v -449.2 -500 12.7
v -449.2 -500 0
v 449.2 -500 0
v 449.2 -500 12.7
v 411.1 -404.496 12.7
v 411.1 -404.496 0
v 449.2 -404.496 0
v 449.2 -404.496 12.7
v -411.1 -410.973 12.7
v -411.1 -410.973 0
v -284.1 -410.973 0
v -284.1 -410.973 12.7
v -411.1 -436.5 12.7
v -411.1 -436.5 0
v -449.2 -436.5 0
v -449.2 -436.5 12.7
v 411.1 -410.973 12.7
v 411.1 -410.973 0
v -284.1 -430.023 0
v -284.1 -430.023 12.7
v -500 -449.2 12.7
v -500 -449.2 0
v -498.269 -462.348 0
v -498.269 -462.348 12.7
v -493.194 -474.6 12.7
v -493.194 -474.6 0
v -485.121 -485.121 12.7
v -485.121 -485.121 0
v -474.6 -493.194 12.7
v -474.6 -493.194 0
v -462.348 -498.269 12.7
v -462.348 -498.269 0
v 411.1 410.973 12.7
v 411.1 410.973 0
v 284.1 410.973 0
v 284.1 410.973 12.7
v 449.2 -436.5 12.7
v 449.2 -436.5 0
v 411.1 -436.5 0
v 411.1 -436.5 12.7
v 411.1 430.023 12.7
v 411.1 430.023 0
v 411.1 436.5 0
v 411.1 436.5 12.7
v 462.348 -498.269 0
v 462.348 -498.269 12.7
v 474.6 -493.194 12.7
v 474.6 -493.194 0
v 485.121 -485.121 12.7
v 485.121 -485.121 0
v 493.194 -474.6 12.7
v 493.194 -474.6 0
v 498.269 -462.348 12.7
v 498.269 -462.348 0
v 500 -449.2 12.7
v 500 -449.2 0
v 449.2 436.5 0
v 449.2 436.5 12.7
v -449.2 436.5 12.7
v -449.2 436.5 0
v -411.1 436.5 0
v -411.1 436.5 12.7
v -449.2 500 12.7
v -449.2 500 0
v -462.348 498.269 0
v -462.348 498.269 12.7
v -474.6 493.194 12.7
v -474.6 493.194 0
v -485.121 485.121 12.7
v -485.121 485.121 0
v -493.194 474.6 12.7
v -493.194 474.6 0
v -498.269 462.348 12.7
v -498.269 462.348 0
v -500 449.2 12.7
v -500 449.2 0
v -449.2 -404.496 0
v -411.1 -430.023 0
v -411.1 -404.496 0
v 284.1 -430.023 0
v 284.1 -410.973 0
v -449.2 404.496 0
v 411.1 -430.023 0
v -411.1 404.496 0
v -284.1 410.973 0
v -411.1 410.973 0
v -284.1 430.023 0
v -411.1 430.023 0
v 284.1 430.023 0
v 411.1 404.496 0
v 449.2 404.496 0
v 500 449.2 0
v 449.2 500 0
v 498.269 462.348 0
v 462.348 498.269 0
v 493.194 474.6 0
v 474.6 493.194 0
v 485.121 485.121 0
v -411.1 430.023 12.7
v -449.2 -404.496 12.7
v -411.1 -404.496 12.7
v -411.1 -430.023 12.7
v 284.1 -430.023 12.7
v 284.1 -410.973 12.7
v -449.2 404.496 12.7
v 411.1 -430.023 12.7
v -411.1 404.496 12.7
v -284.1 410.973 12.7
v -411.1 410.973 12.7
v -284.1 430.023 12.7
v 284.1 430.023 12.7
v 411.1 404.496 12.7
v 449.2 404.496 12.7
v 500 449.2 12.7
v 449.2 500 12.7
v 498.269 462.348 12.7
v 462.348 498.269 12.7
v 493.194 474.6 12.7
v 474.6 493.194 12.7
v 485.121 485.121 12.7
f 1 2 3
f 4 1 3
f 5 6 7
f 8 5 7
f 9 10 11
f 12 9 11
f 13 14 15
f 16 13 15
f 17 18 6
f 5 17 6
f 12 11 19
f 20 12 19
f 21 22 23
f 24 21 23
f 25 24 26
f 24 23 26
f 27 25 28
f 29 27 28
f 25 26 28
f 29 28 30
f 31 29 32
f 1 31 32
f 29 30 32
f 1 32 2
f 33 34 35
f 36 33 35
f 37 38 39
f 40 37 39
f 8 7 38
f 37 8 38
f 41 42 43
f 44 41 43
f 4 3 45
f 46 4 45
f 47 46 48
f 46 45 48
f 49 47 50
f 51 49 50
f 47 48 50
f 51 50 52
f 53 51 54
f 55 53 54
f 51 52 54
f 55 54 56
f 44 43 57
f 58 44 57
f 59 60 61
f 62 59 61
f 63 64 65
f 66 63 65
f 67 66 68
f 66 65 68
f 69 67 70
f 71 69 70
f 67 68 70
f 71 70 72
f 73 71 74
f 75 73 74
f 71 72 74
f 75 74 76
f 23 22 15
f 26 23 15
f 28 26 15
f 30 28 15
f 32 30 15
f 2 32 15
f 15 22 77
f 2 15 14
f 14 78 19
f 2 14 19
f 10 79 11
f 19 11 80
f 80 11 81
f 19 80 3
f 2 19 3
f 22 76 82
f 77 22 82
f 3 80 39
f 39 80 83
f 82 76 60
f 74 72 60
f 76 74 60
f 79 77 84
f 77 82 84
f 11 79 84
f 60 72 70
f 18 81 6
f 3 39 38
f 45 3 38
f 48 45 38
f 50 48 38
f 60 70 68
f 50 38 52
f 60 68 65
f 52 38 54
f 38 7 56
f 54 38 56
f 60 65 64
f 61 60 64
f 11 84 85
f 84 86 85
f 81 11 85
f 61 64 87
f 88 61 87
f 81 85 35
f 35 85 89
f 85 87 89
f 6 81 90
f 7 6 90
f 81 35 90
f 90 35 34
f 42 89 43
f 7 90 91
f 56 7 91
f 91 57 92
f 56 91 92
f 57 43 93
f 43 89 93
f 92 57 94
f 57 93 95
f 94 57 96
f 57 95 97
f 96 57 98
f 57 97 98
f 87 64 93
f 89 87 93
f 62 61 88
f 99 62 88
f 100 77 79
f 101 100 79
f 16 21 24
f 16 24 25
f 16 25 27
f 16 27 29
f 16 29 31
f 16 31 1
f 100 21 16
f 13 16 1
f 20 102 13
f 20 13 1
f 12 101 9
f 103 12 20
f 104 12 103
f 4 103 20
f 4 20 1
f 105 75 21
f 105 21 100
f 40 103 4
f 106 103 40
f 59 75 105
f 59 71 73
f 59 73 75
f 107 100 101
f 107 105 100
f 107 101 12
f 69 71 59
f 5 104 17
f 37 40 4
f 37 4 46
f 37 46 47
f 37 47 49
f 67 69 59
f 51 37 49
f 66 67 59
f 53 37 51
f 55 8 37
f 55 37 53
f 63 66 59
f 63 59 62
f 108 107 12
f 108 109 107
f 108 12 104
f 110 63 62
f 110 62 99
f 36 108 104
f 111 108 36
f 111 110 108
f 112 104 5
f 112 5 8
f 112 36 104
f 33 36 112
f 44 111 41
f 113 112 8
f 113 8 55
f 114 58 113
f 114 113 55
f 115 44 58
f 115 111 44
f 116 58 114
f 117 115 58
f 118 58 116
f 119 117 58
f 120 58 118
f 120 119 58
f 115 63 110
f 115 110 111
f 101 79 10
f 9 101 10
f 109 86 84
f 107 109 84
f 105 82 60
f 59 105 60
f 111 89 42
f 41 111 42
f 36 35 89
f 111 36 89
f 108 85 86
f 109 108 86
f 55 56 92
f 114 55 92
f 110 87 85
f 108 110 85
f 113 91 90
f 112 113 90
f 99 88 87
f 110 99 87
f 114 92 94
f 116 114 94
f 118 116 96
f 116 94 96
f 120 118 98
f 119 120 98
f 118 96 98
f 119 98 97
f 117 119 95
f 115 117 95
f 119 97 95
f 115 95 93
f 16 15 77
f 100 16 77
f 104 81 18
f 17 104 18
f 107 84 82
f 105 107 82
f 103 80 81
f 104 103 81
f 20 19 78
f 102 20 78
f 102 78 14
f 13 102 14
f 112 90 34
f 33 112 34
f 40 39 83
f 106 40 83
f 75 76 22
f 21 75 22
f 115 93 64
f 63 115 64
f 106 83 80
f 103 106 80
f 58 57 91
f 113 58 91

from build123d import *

# Parameters (mm, degrees)
F1_DEPTH = 12.7


with BuildPart() as f1:
    # F0 (on Top) → F1 (new body)
    with BuildSketch(Plane.XY):
        with BuildLine():
            Line((0, 500), (-449.2, 500))
            ThreePointArc((-449.2, 500), (-485.121024, 485.121024), (-500, 449.2))
            Line((-500, 449.2), (-500, 0))
            Line((-500, 0), (0, 0))
            Line((0, 0), (0, 500))
        make_face()
        Polygon((-411.1, 410.973), (-411.1, 404.496), (-449.2, 404.496), (-449.2, 436.5), (-411.1, 436.5), (-411.1, 430.023), (-284.1, 430.023), (-284.1, 410.973), align=None, mode=Mode.SUBTRACT)
        with BuildLine():
            Line((449.2, 500), (0, 500))
            Line((0, 500), (0, 0))
            Line((0, 0), (500, 0))
            Line((500, 0), (500, 449.2))
            ThreePointArc((500, 449.2), (485.121024, 485.121024), (449.2, 500))
        make_face()
        Polygon((411.1, 430.023), (411.1, 436.5), (449.2, 436.5), (449.2, 404.496), (411.1, 404.496), (411.1, 410.973), (284.1, 410.973), (284.1, 430.023), align=None, mode=Mode.SUBTRACT)
        with BuildLine():
            Line((500, 0), (0, 0))
            Line((0, 0), (0, -500))
            Line((0, -500), (449.2, -500))
            ThreePointArc((449.2, -500), (485.121024, -485.121024), (500, -449.2))
            Line((500, -449.2), (500, 0))
        make_face()
        Polygon((284.1, -430.023), (284.1, -410.973), (411.1, -410.973), (411.1, -404.496), (449.2, -404.496), (449.2, -436.5), (411.1, -436.5), (411.1, -430.023), align=None, mode=Mode.SUBTRACT)
        with BuildLine():
            Line((0, -500), (0, 0))
            Line((0, 0), (-500, 0))
            Line((-500, 0), (-500, -449.2))
            ThreePointArc((-500, -449.2), (-485.121024, -485.121024), (-449.2, -500))
            Line((-449.2, -500), (0, -500))
        make_face()
        Polygon((-449.2, -436.5), (-449.2, -404.496), (-411.1, -404.496), (-411.1, -410.973), (-284.1, -410.973), (-284.1, -430.023), (-411.1, -430.023), (-411.1, -436.5), align=None, mode=Mode.SUBTRACT)
    extrude(amount=F1_DEPTH)


solid = f1.part
